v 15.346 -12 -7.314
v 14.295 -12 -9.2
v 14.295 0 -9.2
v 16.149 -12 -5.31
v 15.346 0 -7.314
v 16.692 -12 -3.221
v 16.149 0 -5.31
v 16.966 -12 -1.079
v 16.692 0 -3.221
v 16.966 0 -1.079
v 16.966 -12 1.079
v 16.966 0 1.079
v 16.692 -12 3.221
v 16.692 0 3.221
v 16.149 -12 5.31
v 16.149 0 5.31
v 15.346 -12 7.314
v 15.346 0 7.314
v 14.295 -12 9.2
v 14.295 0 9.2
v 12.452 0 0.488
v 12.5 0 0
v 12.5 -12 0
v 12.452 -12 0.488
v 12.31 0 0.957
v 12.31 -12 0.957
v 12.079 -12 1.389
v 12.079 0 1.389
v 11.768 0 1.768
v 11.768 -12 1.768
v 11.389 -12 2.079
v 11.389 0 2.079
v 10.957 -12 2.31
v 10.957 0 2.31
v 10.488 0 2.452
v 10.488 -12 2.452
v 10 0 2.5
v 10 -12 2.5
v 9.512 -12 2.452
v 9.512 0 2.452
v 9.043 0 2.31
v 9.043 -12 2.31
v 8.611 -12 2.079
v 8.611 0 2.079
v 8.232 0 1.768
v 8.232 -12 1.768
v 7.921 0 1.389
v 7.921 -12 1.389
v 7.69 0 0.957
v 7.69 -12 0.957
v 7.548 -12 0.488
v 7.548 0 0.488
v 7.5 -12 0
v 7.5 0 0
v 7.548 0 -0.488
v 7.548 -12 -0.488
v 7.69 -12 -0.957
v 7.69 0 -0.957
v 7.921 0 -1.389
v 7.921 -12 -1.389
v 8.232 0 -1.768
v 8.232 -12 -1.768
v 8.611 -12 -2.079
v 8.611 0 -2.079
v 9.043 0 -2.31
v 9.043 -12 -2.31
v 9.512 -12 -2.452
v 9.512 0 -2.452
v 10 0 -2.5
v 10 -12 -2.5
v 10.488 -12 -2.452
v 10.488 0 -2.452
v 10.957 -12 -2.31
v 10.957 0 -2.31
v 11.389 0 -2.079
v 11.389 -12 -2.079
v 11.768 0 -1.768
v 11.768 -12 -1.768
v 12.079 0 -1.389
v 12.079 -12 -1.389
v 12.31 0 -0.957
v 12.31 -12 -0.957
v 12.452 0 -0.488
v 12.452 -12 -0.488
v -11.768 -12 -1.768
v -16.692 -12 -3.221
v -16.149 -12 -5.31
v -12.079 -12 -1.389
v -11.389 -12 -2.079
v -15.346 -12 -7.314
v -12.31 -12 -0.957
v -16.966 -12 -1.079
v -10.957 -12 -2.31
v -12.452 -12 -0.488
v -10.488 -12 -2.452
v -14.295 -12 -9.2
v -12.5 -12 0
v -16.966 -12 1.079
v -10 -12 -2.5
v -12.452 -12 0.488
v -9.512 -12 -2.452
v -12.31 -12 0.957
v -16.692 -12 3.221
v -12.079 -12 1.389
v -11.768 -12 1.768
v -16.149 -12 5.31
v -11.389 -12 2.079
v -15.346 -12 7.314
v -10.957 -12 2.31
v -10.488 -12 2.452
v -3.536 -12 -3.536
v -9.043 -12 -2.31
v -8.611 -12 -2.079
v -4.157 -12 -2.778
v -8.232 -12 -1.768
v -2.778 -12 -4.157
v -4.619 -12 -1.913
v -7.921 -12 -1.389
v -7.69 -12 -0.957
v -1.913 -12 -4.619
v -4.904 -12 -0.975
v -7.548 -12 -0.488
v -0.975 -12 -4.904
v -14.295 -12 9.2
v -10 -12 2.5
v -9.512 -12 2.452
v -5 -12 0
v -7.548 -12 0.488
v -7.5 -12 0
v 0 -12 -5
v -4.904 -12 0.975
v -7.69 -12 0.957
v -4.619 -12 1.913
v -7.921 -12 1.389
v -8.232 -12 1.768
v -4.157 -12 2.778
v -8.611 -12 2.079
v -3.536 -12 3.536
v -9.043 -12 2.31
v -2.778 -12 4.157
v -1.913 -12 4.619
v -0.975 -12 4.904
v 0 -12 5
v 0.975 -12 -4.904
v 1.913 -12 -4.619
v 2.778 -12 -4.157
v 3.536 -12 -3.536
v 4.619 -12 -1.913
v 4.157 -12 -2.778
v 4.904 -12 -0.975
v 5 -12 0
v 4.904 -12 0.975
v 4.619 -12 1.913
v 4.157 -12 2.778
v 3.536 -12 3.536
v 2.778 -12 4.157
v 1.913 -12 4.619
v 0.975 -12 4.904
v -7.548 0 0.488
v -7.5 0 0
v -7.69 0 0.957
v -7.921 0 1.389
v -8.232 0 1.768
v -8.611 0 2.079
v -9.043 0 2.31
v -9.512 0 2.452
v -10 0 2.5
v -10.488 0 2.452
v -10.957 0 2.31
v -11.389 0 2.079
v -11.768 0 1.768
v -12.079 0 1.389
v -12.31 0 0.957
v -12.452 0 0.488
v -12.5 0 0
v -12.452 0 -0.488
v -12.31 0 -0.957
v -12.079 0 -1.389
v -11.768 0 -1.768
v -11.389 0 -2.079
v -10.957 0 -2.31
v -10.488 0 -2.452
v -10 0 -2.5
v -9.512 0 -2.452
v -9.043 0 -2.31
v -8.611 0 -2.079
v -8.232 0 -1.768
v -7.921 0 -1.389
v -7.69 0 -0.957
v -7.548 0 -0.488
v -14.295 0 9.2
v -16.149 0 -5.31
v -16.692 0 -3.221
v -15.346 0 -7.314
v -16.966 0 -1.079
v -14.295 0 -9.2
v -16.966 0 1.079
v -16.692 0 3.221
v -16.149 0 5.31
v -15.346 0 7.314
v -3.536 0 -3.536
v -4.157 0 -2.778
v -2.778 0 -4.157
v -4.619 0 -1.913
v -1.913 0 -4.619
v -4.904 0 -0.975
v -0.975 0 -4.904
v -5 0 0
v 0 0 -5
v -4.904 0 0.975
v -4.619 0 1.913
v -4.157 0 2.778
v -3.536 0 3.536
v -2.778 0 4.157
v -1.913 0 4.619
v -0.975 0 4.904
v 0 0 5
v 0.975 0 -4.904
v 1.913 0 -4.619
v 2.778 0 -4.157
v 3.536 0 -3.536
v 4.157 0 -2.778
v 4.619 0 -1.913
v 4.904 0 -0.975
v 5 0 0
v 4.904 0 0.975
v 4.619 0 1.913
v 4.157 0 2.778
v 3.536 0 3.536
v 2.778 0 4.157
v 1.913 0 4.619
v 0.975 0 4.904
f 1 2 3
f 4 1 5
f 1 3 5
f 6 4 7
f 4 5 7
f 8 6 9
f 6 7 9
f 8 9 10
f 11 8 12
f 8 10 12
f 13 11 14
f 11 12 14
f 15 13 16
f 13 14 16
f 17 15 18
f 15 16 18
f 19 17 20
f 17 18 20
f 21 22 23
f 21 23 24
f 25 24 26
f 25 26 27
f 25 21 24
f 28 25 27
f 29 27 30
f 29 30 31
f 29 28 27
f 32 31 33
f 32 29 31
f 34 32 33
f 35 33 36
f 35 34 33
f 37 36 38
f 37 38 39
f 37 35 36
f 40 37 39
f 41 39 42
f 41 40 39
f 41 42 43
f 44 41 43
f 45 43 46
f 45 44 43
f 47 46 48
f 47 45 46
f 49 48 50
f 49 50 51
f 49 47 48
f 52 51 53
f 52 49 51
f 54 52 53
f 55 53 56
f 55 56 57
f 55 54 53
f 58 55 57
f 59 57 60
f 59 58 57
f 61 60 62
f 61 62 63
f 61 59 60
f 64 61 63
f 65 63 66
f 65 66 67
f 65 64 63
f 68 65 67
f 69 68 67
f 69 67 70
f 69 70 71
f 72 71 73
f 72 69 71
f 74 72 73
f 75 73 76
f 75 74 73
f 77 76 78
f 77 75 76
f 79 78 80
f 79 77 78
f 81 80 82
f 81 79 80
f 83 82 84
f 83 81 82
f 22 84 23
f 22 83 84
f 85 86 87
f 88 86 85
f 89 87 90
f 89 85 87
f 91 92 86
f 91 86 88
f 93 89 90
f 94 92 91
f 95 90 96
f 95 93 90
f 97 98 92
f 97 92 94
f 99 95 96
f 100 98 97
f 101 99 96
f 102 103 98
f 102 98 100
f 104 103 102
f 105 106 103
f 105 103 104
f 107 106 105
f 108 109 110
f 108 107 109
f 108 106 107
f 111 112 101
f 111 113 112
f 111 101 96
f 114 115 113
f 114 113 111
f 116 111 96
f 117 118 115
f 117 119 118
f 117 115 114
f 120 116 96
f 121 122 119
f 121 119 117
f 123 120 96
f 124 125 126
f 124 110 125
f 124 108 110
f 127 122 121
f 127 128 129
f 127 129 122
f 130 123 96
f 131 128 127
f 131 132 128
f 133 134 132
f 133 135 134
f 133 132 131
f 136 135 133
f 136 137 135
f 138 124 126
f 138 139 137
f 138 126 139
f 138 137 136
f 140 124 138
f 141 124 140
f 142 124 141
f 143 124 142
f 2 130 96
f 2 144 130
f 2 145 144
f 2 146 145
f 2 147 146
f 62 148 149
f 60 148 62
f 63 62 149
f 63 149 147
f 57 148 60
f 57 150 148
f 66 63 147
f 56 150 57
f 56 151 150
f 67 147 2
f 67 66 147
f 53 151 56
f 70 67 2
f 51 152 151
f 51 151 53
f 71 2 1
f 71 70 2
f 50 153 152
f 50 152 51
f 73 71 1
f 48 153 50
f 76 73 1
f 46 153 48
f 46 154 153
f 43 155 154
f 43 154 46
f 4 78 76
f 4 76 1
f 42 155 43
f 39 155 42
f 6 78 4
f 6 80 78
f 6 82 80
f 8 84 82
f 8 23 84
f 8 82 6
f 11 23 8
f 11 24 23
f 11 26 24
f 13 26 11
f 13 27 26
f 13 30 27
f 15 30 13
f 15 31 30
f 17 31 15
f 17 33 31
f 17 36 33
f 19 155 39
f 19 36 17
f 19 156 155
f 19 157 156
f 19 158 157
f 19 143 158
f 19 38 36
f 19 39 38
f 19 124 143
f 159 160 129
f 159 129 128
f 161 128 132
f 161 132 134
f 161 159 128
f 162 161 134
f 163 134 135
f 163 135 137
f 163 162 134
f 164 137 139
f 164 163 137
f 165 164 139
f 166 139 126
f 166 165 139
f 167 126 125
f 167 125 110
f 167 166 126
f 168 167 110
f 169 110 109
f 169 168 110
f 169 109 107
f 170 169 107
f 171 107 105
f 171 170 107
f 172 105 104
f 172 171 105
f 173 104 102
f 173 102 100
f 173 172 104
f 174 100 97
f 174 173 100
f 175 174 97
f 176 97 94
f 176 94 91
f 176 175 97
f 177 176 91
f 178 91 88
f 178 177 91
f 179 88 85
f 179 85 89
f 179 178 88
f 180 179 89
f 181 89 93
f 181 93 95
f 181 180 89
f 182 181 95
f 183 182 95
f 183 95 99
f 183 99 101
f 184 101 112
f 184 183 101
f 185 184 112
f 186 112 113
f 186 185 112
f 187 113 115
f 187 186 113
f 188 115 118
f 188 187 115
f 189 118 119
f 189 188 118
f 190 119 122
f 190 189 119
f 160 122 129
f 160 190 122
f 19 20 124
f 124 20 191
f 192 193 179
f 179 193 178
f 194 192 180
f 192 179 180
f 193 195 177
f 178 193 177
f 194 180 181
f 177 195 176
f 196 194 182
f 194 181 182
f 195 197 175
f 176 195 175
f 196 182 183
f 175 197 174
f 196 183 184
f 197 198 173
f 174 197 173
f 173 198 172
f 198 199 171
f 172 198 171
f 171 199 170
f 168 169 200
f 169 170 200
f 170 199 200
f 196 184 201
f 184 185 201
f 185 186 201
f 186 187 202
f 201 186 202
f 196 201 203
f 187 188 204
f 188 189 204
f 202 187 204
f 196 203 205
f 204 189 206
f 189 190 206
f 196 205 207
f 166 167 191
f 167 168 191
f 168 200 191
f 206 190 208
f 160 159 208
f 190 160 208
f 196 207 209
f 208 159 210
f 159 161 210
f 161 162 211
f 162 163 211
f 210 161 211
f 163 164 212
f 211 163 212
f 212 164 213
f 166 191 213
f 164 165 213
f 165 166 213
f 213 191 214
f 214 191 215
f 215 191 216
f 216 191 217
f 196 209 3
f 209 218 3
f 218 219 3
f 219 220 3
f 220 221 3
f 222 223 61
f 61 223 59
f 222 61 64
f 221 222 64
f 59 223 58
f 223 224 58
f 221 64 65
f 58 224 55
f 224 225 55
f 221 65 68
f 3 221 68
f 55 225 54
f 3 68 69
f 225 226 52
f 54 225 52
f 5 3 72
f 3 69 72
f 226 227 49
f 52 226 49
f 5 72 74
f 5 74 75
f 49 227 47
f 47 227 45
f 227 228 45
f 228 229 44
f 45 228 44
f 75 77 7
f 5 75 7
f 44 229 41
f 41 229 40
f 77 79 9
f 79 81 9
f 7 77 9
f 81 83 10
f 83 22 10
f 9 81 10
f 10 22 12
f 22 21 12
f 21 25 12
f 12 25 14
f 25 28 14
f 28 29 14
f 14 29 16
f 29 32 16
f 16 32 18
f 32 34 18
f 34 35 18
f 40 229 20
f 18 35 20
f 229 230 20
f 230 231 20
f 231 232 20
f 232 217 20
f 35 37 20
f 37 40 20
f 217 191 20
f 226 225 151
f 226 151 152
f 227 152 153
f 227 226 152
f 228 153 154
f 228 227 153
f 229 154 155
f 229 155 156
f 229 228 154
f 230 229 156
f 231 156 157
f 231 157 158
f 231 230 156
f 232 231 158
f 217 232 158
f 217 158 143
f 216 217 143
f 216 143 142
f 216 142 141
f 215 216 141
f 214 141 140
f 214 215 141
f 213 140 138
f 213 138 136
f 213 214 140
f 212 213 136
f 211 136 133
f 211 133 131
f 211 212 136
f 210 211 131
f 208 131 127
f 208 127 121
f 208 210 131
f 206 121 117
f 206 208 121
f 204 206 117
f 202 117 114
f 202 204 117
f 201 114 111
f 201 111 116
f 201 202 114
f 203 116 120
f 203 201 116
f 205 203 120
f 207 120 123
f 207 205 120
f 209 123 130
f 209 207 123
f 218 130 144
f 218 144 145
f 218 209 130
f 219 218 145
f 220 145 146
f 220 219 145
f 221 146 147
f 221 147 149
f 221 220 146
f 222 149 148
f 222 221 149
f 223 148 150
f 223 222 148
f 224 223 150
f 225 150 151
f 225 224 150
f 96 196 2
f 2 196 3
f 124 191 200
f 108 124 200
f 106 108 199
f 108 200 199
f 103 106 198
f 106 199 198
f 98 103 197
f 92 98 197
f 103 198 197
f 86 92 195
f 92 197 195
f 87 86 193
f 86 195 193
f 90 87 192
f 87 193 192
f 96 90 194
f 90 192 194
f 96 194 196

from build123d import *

# Parameters (mm, degrees)
F0_R     = 17
F0_R_2   = 2.5
F0_R_3   = 5
F1_DEPTH = 12
F3_DEPTH = 25


with BuildPart() as f1:
    # F0 (on Front) → F1 (new body)
    with BuildSketch(Plane.XZ):
        Circle(F0_R)
        with Locations((-10, 0)):
            Circle(F0_R_2, mode=Mode.SUBTRACT)
        Circle(F0_R_3, mode=Mode.SUBTRACT)
        with Locations((10, 0)):
            Circle(F0_R_2, mode=Mode.SUBTRACT)
    extrude(amount=F1_DEPTH)

    # F2 (on face) → F3 (cut)
    with BuildSketch(Plane(origin=(0, 0, 0), x_dir=(-1, 0, 0), z_dir=(0, 1, 0))):
        with BuildLine():
            ThreePointArc((14.2954538228, 9.2), (0, 17), (-14.2954538228, 9.2))
            Line((-14.2954538228, 9.2), (14.2954538228, 9.2))
        make_face()
        with BuildLine():
            Line((14.2954538228, -9.2), (-14.2954538228, -9.2))
            ThreePointArc((-14.2954538228, -9.2), (0, -17), (14.2954538228, -9.2))
        make_face()
    extrude(amount=-F3_DEPTH, mode=Mode.SUBTRACT)


solid = f1.part
